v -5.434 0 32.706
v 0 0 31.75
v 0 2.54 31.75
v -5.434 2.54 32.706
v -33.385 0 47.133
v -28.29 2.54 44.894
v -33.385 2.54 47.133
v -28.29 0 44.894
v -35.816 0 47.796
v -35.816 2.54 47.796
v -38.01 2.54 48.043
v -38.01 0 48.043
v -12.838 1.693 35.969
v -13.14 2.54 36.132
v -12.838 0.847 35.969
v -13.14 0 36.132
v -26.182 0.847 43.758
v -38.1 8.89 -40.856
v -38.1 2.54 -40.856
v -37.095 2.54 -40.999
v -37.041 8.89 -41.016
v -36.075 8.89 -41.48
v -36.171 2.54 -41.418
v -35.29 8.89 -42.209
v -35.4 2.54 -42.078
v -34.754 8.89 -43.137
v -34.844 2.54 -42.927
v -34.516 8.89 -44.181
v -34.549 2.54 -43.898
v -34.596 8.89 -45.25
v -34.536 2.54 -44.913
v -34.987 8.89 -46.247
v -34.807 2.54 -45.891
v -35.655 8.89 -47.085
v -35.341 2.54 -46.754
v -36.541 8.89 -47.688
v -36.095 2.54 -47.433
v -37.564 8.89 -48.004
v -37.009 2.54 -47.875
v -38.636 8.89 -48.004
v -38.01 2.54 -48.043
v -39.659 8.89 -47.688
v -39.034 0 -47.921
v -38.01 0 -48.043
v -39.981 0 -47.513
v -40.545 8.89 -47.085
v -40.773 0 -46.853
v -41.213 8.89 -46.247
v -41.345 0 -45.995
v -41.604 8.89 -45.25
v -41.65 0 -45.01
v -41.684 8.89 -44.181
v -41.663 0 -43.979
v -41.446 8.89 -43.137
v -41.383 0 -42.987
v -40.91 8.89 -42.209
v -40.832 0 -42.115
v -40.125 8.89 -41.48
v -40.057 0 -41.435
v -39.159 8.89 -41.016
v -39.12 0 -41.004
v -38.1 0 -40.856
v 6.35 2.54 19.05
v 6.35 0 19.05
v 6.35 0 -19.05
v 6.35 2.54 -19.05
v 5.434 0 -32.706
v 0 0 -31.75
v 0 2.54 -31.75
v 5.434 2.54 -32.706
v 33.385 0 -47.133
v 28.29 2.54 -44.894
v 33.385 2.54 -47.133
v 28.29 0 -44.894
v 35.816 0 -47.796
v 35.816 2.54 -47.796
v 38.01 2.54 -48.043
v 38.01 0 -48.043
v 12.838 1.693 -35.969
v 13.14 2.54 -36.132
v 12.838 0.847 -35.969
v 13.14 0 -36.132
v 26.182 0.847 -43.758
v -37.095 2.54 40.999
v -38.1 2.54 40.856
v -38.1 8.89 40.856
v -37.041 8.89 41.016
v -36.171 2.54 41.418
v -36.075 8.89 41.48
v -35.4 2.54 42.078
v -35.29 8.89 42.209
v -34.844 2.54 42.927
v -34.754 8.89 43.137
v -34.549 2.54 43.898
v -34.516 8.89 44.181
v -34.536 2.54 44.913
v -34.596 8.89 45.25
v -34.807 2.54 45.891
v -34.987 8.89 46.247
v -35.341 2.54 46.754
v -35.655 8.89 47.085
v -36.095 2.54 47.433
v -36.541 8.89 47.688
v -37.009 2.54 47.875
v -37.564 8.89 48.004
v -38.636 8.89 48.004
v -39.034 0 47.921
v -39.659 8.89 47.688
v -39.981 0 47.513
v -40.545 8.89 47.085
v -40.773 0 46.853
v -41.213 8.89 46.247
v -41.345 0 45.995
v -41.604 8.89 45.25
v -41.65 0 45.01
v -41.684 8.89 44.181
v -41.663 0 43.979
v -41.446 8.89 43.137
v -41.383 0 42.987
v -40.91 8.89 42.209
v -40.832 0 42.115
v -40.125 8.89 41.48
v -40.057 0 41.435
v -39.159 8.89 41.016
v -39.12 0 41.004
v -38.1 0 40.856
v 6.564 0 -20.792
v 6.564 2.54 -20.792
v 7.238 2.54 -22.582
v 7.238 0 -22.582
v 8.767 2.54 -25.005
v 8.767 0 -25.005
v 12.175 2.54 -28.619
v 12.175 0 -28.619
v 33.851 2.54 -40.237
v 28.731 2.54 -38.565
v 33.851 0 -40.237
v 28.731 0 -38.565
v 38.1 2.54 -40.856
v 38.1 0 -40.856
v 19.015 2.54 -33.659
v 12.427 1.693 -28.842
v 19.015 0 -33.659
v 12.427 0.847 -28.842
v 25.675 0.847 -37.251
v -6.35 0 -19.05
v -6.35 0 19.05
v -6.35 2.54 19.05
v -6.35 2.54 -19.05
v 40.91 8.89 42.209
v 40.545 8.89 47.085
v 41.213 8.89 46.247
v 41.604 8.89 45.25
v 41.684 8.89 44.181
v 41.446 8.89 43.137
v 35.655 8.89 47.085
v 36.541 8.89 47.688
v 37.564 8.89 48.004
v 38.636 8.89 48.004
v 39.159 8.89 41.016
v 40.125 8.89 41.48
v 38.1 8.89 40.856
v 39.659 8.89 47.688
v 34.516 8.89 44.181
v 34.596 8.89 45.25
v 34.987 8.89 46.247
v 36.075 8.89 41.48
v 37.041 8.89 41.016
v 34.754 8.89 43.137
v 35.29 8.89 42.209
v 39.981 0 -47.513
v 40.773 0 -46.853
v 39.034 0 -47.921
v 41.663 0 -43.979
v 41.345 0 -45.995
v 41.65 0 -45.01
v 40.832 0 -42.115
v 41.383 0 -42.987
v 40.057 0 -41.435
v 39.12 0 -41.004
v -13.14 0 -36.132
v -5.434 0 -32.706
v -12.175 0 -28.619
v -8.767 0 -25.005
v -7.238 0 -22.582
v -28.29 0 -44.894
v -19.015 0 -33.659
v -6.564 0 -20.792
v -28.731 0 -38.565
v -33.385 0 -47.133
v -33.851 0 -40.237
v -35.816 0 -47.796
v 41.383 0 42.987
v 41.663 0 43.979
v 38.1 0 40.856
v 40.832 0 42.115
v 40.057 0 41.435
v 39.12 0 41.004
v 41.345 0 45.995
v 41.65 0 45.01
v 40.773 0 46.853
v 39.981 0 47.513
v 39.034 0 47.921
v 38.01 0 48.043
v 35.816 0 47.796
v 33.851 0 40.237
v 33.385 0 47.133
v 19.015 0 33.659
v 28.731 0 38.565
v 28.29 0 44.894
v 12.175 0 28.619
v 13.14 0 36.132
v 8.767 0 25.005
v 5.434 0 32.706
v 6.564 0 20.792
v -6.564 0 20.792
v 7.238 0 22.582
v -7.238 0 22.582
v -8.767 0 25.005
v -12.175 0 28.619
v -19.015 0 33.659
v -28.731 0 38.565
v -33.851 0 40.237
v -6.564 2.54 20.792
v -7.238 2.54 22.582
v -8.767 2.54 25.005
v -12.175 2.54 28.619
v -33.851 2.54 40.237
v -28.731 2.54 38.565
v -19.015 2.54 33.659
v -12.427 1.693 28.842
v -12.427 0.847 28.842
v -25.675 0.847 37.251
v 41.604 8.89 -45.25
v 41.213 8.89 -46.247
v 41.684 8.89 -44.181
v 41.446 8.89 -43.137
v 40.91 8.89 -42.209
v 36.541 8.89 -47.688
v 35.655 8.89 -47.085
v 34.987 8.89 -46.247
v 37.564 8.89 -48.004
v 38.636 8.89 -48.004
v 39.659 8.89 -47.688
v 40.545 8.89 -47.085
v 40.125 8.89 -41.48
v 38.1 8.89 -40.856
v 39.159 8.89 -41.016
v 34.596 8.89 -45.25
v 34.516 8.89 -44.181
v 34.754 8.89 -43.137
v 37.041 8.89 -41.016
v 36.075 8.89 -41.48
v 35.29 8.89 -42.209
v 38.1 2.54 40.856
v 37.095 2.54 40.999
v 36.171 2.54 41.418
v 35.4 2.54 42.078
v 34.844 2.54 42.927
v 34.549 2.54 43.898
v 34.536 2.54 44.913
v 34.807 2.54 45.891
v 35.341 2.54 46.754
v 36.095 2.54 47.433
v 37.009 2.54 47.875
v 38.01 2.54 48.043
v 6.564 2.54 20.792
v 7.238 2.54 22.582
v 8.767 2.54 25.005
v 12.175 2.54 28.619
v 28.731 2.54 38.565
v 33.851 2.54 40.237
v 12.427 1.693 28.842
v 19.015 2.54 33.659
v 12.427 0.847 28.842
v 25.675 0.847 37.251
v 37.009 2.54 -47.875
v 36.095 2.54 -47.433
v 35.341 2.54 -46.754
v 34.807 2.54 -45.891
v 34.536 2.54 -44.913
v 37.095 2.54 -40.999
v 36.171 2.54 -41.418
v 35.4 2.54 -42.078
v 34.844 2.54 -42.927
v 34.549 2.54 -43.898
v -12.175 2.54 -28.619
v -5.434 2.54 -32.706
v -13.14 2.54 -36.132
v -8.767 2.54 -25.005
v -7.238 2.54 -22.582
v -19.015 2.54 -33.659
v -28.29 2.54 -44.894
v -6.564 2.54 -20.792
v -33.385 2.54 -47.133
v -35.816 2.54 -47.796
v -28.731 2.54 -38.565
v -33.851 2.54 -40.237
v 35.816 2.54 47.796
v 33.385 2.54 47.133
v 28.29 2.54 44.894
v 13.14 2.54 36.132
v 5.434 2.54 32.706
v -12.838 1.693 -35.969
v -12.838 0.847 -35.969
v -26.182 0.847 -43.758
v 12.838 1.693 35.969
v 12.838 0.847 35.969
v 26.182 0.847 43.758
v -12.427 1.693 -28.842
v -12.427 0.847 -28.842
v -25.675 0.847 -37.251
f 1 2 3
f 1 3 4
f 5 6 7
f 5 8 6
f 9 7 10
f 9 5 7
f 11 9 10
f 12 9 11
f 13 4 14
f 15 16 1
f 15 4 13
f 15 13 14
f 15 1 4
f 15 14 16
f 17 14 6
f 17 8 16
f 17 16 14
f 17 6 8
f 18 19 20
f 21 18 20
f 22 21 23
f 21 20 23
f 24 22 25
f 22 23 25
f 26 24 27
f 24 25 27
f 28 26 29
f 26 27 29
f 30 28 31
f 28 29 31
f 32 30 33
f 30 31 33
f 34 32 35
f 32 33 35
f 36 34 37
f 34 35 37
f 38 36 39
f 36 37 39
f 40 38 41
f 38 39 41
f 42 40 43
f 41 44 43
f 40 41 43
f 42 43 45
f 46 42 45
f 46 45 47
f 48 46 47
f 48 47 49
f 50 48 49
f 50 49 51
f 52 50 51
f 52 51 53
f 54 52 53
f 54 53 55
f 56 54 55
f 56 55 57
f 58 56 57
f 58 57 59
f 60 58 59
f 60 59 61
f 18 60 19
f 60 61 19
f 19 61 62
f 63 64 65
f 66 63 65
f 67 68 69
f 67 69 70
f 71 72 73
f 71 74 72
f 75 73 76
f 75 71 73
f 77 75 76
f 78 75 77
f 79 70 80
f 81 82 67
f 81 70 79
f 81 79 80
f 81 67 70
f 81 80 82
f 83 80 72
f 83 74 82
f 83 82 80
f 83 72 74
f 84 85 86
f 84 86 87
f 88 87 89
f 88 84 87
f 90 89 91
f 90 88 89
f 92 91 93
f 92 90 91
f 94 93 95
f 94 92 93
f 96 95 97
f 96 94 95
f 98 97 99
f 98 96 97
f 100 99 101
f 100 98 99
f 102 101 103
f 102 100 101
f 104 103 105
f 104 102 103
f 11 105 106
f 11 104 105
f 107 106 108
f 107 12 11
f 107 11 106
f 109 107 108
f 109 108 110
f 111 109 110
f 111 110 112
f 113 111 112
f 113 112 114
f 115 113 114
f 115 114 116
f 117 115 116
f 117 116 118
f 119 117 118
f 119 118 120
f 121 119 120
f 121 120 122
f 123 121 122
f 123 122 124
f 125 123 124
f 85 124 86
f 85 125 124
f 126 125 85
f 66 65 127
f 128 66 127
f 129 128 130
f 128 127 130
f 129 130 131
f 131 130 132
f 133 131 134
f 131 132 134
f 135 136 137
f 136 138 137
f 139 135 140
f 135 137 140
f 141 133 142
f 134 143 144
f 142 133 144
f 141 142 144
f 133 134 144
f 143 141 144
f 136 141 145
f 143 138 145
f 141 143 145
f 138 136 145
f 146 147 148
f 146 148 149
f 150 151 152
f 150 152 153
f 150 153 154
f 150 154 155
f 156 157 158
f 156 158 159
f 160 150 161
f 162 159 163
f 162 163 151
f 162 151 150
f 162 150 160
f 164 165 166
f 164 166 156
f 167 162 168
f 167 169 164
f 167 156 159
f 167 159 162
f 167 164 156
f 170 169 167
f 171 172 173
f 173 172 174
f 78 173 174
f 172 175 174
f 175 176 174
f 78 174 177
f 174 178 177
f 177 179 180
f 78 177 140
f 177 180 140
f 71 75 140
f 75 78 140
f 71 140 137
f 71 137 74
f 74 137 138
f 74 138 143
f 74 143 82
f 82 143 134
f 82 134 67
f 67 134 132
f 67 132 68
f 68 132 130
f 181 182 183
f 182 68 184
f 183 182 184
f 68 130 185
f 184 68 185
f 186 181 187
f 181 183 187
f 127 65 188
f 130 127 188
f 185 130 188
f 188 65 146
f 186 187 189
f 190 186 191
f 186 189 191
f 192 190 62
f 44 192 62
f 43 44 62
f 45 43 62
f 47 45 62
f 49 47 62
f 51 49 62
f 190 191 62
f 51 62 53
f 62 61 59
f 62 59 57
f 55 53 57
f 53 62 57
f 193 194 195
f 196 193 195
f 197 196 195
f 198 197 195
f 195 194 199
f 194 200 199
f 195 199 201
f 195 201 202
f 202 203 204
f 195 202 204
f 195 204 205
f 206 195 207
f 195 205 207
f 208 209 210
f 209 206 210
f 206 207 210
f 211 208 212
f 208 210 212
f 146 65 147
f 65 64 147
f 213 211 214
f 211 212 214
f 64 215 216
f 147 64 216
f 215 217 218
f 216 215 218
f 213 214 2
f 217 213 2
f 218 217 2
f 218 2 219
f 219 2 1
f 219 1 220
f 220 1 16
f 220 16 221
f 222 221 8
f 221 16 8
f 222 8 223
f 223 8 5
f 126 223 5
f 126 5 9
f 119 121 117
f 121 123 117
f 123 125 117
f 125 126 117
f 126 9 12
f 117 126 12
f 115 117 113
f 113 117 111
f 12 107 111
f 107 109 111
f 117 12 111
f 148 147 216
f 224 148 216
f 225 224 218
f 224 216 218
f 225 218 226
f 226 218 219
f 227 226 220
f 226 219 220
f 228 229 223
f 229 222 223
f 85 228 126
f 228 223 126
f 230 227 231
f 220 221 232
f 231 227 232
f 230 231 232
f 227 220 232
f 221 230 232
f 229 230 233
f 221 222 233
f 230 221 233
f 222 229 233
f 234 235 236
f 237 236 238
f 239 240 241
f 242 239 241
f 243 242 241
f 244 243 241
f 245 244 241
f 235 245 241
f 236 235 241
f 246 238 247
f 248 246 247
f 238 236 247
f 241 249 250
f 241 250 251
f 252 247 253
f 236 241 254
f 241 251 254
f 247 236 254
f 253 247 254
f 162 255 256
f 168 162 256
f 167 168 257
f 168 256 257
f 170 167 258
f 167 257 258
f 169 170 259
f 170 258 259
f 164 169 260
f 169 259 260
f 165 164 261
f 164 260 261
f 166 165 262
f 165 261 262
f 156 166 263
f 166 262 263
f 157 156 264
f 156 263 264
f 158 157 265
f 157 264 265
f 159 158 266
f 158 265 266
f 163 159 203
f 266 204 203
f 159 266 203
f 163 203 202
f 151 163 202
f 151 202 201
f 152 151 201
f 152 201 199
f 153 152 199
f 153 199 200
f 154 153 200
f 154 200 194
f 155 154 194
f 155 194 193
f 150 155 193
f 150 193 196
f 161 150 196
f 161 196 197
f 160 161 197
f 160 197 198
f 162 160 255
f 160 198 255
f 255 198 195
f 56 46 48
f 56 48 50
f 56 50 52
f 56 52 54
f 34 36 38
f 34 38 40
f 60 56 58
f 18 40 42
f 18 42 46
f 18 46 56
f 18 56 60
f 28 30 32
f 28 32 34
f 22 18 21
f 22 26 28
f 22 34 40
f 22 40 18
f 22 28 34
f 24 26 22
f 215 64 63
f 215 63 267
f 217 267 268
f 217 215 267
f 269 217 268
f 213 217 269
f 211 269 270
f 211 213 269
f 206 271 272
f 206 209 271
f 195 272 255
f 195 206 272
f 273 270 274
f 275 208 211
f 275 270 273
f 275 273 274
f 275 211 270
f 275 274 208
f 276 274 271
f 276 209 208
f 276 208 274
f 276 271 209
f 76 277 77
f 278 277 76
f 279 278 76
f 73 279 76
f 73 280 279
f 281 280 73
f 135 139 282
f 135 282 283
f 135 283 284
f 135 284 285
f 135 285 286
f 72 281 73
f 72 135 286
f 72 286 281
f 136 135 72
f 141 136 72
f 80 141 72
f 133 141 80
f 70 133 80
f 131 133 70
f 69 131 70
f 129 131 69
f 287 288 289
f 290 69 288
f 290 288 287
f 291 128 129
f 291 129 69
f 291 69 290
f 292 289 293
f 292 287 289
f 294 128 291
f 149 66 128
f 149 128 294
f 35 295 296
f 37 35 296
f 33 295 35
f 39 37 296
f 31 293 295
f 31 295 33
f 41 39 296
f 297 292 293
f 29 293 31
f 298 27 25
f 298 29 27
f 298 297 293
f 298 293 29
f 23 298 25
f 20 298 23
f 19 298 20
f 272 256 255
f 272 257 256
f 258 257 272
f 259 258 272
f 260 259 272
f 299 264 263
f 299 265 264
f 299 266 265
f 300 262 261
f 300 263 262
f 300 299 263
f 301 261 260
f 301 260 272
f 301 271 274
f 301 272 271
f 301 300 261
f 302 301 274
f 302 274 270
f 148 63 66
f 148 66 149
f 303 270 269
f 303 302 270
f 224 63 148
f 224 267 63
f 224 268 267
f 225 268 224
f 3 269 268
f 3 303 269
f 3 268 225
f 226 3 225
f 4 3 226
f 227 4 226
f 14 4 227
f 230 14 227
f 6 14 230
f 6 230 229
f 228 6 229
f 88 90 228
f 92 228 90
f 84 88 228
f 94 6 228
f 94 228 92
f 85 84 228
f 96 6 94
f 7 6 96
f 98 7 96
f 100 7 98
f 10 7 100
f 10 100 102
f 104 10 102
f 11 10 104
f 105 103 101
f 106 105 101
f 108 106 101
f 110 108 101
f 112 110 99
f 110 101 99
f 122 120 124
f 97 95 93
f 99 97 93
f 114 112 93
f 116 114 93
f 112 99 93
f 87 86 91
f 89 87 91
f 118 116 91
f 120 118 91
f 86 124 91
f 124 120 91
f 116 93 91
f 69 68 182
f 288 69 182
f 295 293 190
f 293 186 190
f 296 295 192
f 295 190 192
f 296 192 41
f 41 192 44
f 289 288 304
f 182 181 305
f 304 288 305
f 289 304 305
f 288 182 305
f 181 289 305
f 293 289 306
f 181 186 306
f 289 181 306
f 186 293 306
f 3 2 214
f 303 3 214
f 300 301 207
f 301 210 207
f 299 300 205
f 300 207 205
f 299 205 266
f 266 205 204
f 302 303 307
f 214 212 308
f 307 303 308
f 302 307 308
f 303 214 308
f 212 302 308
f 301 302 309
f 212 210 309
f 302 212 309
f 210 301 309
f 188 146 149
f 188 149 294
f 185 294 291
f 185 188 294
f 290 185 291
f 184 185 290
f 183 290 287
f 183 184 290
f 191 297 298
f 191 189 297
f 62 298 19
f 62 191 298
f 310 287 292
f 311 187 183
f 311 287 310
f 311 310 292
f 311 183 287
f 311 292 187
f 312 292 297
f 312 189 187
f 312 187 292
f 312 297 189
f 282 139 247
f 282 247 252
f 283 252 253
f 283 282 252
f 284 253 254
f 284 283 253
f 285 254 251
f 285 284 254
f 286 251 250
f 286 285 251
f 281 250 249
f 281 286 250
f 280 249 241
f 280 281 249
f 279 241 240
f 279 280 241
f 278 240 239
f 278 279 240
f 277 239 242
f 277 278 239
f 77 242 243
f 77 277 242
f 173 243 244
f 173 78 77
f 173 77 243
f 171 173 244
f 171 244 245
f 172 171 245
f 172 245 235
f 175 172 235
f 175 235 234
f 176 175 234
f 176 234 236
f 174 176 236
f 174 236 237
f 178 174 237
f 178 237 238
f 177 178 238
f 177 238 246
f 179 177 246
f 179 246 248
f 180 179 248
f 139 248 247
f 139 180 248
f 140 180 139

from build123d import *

# Parameters (mm, degrees)
BOSS_EXTRUDE1_DEPTH                        = 2.54
SKETCH2_R                                  = 3.594100000000004
BOSS_EXTRUDE2_DEPTH                        = 6.35
MIRROR1_AT_THE_SECOND_PLANE_COPY_1_DEPTH   = 2.54
MIRROR1_AT_THE_SECOND_PLANE_COPY_2_SKETC_R = 3.594100000000004
MIRROR1_AT_THE_SECOND_PLANE_COPY_2_DEPTH   = 6.35


with BuildPart() as part:
    # Sketch1 → Boss-Extrude1 (new body)
    with BuildSketch(Plane(origin=(0, 0, 0), x_dir=(1, 0, 0), z_dir=(0, 1, 0))):
        with BuildLine():
            Line((-6.35, -7.8e-16), (0, 0))
            Line((0, 0), (0, 31.75))
            add(Edge.make_bspline(
                [(0, 31.75), (-11.909179237119448, 31.827130893047123), (-27.615811236602134, 47.867470834719654), (-38.01020913703169, 48.0429782090805)],
                knots=[0, 0, 0, 0, 0.9971245716363047, 0.9971245716363047, 0.9971245716363047, 0.9971245716363047], degree=3))
            ThreePointArc((-38.01020913703169, 48.0429782090805), (-35.52703749049909, 46.95946582656603), (-34.5059, 44.44999999999999))
            ThreePointArc((-34.5059, 44.44999999999999), (-35.55858751773743, 41.908587517737416), (-38.1, 40.855899999999984))
            add(Edge.make_bspline(
                [(-6.35, 19.05), (-6.175250797111612, 28.394037165914764), (-28.752700179166496, 40.793112384563265), (-38.1, 40.855899999999984)],
                knots=[0, 0, 0, 0, 1, 1, 1, 1], degree=3))
            Line((-6.35, 19.05), (-6.35, -7.8e-16))
        make_face()
        with BuildLine():
            add(Edge.make_bspline(
                [(-38.01020913703169, 48.0429782090805), (-38.04018367320963, 48.043484323257836), (-38.07011403368422, 48.04385850798247), (-38.100000000000016, 48.04409999999999)],
                knots=[0.9971245716363047, 0.9971245716363047, 0.9971245716363047, 0.9971245716363047, 1, 1, 1, 1], degree=3))
            ThreePointArc((-38.01020913703169, 48.0429782090805), (-38.05510106491391, 48.04381954132759), (-38.100000000000016, 48.04409999999999))
        make_face()
        with BuildLine():
            ThreePointArc((-34.5059, 44.44999999999999), (-35.52703749049909, 46.95946582656603), (-38.01020913703169, 48.0429782090805))
            add(Edge.make_bspline(
                [(-38.01020913703169, 48.0429782090805), (-38.04018367320963, 48.043484323257836), (-38.07011403368422, 48.04385850798247), (-38.100000000000016, 48.04409999999999)],
                knots=[0.9971245716363047, 0.9971245716363047, 0.9971245716363047, 0.9971245716363047, 1, 1, 1, 1], degree=3))
            ThreePointArc((-38.100000000000016, 48.04409999999999), (-41.694100000000006, 44.44999999999998), (-38.1, 40.855899999999984))
            ThreePointArc((-38.1, 40.855899999999984), (-35.55858751773743, 41.908587517737416), (-34.5059, 44.44999999999999))
        make_face()
    boss_extrude1 = extrude(amount=BOSS_EXTRUDE1_DEPTH)

    # Sketch2 → Boss-Extrude2 (add)
    with BuildSketch(Plane(origin=(0, 2.54, 0), x_dir=(1, 0, 0), z_dir=(0, 1, 0))):
        with Locations(Location((-38.1, 44.44999999999999, 0), (0, 0, 270))):
            Circle(SKETCH2_R)
    boss_extrude2 = extrude(amount=BOSS_EXTRUDE2_DEPTH)

    # Mirror1: Boss-Extrude1, Boss-Extrude2 across plane
    add(boss_extrude1.mirror(Plane(origin=(0, 0, 0), x_dir=(0, 0, 1), z_dir=(1, 0, 0))))
    add(boss_extrude2.mirror(Plane(origin=(0, 0, 0), x_dir=(0, 0, 1), z_dir=(1, 0, 0))))

    # Mirror1 at the second plane: Boss-Extrude1, Boss-Extrude2 across plane
    add(boss_extrude1.mirror(Plane.XY))
    add(boss_extrude2.mirror(Plane.XY))

    # Mirror1 at the second plane copy 1 sketc → Mirror1 at the second plane copy 1 (add)
    with BuildSketch(Plane(origin=(0, 0, 0), x_dir=(-1, 0, 0), z_dir=(0, 1, 0))):
        with BuildLine():
            Line((-6.35, -7.8e-16), (0, 0))
            Line((0, 0), (0, 31.75))
            add(Edge.make_bspline(
                [(0, 31.75), (-11.909179237119448, 31.827130893047123), (-27.615811236602134, 47.867470834719654), (-38.01020913703169, 48.0429782090805)],
                knots=[0, 0, 0, 0, 0.9971245716363047, 0.9971245716363047, 0.9971245716363047, 0.9971245716363047], degree=3))
            ThreePointArc((-38.01020913703169, 48.0429782090805), (-35.52703749049909, 46.95946582656603), (-34.5059, 44.44999999999999))
            ThreePointArc((-34.5059, 44.44999999999999), (-35.55858751773743, 41.908587517737416), (-38.1, 40.855899999999984))
            add(Edge.make_bspline(
                [(-6.35, 19.05), (-6.175250797111612, 28.394037165914764), (-28.752700179166496, 40.793112384563265), (-38.1, 40.855899999999984)],
                knots=[0, 0, 0, 0, 1, 1, 1, 1], degree=3))
            Line((-6.35, 19.05), (-6.35, -7.8e-16))
        make_face()
        with BuildLine():
            add(Edge.make_bspline(
                [(-38.01020913703169, 48.0429782090805), (-38.04018367320963, 48.043484323257836), (-38.07011403368422, 48.04385850798247), (-38.100000000000016, 48.04409999999999)],
                knots=[0.9971245716363047, 0.9971245716363047, 0.9971245716363047, 0.9971245716363047, 1, 1, 1, 1], degree=3))
            ThreePointArc((-38.01020913703169, 48.0429782090805), (-38.05510106491391, 48.04381954132759), (-38.100000000000016, 48.04409999999999))
        make_face()
        with BuildLine():
            ThreePointArc((-34.5059, 44.44999999999999), (-35.52703749049909, 46.95946582656603), (-38.01020913703169, 48.0429782090805))
            add(Edge.make_bspline(
                [(-38.01020913703169, 48.0429782090805), (-38.04018367320963, 48.043484323257836), (-38.07011403368422, 48.04385850798247), (-38.100000000000016, 48.04409999999999)],
                knots=[0.9971245716363047, 0.9971245716363047, 0.9971245716363047, 0.9971245716363047, 1, 1, 1, 1], degree=3))
            ThreePointArc((-38.100000000000016, 48.04409999999999), (-41.694100000000006, 44.44999999999998), (-38.1, 40.855899999999984))
            ThreePointArc((-38.1, 40.855899999999984), (-35.55858751773743, 41.908587517737416), (-34.5059, 44.44999999999999))
        make_face()
    extrude(amount=MIRROR1_AT_THE_SECOND_PLANE_COPY_1_DEPTH)

    # Mirror1 at the second plane copy 2 sketc → Mirror1 at the second plane copy 2 (add)
    with BuildSketch(Plane(origin=(0, 2.54, 0), x_dir=(-1, 0, 0), z_dir=(0, 1, 0))):
        with Locations(Location((-38.1, 44.44999999999999, 0), (0, 0, 270))):
            Circle(MIRROR1_AT_THE_SECOND_PLANE_COPY_2_SKETC_R)
    extrude(amount=MIRROR1_AT_THE_SECOND_PLANE_COPY_2_DEPTH)


solid = part.part
